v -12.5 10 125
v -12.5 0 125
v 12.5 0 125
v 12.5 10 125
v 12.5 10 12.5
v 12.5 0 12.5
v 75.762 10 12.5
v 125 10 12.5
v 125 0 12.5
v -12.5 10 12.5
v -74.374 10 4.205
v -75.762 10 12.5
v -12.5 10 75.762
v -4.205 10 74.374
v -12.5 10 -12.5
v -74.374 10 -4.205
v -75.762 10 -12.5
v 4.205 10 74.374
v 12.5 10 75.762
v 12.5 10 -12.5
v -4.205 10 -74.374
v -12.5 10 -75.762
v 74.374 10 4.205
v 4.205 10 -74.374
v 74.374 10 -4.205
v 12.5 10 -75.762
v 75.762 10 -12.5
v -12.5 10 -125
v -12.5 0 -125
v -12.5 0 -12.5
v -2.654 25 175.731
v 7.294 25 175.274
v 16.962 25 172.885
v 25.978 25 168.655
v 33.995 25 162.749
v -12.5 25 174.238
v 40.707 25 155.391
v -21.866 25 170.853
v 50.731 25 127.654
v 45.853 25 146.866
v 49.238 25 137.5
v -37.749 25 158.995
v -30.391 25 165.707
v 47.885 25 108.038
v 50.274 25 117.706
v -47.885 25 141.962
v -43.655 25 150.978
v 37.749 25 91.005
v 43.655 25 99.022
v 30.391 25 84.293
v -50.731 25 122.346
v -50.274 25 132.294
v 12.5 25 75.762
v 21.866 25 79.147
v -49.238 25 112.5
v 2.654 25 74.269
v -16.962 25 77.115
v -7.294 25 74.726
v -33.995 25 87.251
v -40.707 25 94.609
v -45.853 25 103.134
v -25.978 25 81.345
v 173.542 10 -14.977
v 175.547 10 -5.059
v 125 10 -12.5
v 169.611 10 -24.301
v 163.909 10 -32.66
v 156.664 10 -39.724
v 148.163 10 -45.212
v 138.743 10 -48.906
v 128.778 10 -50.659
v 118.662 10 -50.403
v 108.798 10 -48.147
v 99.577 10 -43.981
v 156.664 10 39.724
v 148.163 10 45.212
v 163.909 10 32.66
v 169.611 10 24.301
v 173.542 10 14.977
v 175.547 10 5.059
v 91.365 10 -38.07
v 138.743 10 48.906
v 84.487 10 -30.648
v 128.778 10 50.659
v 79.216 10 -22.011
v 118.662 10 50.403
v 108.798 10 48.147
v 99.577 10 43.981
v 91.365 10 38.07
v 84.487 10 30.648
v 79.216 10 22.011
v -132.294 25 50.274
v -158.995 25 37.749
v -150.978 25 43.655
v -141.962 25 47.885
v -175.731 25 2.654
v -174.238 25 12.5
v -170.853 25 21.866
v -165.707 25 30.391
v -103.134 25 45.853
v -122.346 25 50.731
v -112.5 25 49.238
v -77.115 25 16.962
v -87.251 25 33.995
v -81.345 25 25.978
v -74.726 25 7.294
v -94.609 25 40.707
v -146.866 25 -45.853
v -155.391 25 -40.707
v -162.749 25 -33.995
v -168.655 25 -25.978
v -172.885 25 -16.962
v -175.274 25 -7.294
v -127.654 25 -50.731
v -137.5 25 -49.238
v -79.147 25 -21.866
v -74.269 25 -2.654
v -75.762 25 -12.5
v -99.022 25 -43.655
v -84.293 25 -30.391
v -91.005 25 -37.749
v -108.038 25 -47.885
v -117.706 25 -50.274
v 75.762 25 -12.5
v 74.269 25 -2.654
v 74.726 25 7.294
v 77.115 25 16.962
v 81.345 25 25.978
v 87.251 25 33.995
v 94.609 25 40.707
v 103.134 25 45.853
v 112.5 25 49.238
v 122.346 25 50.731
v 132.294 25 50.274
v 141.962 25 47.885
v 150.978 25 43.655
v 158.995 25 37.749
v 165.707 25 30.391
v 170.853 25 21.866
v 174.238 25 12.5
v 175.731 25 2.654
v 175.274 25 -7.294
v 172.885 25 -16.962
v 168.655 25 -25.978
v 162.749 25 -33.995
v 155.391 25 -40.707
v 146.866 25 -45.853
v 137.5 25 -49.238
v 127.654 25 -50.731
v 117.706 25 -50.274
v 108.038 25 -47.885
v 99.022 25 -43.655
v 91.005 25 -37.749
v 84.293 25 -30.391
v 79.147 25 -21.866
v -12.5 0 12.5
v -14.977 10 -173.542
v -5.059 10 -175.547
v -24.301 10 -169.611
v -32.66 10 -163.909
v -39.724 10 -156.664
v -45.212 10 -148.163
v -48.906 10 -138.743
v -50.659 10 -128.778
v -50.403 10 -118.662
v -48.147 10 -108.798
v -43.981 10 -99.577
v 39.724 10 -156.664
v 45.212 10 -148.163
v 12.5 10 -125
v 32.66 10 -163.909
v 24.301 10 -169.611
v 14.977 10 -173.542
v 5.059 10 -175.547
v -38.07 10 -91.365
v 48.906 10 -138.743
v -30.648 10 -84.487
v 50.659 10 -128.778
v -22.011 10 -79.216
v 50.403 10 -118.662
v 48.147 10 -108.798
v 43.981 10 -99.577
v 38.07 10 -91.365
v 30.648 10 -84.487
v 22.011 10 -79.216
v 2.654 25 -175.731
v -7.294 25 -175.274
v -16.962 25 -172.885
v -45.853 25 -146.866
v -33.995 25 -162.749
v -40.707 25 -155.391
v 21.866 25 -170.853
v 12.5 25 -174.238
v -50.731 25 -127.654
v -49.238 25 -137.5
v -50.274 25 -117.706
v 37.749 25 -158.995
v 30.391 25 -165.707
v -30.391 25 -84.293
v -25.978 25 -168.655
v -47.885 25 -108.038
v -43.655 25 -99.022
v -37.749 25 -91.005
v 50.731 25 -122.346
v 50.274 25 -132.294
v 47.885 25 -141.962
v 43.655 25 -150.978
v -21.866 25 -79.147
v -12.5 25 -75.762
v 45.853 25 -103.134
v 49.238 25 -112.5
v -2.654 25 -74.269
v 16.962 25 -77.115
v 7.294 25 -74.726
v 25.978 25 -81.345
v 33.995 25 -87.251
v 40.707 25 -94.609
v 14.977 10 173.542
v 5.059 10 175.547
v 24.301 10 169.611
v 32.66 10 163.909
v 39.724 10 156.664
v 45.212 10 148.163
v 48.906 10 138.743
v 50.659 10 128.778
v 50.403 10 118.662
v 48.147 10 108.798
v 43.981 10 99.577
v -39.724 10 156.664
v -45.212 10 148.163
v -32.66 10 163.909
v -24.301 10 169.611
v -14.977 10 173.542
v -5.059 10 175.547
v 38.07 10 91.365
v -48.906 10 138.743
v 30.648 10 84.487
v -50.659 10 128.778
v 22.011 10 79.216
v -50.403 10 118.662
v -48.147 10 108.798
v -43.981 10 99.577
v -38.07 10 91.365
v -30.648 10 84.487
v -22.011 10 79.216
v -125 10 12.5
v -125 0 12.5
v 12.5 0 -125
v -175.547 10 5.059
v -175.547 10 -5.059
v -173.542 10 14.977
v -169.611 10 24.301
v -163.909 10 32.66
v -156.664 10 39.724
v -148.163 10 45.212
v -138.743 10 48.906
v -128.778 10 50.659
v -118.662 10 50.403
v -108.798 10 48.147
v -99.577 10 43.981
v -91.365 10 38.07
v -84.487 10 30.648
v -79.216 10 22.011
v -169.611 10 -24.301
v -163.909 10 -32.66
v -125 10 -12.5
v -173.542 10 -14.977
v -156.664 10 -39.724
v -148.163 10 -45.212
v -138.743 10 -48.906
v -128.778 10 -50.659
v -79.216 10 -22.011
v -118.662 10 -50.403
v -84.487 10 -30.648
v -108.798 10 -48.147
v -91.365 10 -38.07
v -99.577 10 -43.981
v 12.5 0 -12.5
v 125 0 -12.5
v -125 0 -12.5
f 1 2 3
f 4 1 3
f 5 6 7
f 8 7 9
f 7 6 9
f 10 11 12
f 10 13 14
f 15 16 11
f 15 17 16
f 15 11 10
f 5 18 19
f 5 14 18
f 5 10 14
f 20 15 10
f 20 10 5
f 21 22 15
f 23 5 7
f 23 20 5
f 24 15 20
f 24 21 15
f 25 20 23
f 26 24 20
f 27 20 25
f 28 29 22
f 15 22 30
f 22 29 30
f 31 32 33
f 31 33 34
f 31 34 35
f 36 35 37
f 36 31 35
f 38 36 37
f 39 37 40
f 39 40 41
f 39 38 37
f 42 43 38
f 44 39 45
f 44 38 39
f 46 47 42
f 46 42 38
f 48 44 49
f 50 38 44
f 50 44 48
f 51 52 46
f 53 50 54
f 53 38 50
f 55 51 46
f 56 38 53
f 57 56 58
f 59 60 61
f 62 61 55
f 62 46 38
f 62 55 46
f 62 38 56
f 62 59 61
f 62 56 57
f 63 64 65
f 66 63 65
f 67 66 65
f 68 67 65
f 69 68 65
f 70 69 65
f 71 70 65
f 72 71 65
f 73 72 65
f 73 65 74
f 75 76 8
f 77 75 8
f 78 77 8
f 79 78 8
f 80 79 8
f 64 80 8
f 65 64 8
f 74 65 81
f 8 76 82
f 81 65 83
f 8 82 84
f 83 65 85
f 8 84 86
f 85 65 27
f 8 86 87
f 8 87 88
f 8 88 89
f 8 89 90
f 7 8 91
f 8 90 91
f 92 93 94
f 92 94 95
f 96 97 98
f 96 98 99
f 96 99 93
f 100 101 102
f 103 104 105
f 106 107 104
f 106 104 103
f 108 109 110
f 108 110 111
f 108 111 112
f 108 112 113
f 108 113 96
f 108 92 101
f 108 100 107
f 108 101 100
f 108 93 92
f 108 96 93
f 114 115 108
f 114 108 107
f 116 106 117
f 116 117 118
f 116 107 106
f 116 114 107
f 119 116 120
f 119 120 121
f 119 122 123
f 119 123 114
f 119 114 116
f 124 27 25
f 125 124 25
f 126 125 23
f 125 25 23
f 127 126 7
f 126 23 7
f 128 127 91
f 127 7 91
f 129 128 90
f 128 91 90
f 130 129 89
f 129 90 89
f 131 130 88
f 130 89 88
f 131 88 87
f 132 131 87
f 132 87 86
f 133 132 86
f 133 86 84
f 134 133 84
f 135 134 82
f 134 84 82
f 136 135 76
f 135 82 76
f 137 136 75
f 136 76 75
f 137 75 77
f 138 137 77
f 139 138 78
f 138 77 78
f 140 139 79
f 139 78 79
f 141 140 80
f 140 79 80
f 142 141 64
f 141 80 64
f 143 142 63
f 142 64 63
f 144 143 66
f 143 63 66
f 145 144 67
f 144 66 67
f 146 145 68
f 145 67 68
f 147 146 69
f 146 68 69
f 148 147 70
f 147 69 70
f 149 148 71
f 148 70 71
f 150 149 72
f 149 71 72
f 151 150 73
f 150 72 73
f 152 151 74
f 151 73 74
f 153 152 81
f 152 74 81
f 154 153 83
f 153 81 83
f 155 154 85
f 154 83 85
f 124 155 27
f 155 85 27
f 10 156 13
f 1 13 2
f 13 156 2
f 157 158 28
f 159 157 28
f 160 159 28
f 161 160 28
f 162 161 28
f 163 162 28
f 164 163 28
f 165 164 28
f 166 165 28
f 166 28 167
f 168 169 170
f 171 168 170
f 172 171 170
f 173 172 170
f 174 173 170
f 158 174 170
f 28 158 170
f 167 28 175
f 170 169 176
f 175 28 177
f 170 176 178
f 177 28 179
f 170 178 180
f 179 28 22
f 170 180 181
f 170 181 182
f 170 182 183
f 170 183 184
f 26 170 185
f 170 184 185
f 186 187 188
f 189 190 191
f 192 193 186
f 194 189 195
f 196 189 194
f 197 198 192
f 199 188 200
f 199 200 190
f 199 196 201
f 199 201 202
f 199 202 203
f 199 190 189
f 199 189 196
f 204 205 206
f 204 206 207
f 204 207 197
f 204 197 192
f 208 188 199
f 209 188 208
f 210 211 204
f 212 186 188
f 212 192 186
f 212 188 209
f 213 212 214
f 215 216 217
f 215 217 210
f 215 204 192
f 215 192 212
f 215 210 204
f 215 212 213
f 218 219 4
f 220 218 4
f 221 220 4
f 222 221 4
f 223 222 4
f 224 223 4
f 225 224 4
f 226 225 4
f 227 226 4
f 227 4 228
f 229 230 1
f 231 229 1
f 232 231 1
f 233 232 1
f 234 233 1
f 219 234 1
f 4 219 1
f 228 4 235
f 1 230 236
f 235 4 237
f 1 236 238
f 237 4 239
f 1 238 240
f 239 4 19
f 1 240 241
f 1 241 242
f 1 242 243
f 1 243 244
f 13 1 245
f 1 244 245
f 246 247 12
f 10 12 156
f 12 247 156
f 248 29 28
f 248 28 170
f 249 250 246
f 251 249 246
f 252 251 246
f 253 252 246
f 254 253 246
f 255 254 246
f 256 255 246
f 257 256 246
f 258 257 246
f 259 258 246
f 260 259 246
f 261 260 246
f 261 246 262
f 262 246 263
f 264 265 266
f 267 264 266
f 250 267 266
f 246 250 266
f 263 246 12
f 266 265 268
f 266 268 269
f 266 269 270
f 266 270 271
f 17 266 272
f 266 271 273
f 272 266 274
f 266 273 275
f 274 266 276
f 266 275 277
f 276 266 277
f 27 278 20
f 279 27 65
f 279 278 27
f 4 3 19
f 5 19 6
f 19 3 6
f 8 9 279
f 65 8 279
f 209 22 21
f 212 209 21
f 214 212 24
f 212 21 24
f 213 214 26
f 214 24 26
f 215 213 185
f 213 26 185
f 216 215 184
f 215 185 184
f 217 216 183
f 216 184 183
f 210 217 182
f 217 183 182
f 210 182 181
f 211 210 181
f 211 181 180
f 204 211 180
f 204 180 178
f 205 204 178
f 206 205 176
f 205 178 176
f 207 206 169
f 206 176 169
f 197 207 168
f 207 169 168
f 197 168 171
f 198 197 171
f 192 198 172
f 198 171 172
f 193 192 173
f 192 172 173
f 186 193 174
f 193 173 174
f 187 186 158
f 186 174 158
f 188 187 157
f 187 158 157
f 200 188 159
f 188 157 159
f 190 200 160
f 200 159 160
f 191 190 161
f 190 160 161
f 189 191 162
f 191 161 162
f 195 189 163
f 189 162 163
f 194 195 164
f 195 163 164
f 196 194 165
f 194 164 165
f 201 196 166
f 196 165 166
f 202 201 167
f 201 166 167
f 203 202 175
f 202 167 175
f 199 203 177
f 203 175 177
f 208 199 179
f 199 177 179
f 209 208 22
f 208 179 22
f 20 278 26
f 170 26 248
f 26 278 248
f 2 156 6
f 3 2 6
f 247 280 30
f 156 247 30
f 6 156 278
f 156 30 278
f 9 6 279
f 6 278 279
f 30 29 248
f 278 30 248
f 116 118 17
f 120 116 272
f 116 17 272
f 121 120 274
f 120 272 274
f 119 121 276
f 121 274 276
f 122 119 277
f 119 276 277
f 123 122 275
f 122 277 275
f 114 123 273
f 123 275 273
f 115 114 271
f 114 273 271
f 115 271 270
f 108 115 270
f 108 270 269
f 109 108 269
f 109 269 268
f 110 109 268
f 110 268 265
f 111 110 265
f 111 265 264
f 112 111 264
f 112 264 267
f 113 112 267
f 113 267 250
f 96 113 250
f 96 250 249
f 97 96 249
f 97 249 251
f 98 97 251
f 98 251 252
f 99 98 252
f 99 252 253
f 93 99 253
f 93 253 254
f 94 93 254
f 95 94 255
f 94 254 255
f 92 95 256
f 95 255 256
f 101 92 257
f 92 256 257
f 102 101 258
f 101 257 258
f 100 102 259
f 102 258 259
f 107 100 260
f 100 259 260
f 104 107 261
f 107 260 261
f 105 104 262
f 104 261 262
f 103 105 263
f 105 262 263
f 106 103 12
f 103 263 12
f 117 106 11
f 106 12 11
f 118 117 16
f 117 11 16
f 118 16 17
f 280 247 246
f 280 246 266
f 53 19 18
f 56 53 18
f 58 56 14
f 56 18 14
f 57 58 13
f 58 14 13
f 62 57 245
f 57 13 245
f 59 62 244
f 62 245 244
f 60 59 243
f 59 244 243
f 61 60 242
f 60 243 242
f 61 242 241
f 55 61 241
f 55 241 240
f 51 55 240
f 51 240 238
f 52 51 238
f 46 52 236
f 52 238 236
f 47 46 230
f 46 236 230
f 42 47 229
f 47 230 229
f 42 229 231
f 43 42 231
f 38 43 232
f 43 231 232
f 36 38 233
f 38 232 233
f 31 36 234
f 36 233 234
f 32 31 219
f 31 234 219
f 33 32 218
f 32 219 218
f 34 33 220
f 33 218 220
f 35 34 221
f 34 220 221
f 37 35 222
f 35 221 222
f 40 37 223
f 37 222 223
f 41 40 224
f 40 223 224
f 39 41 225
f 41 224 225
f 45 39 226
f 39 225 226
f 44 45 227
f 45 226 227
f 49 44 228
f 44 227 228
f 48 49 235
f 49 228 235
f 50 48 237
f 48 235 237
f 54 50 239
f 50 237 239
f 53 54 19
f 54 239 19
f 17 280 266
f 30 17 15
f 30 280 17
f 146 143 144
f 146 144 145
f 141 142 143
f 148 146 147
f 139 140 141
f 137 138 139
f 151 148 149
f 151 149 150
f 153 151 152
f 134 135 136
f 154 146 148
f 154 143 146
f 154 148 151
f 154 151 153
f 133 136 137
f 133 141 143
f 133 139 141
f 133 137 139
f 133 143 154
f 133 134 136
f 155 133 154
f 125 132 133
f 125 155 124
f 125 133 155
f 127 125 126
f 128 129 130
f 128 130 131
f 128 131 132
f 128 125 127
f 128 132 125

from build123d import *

# Parameters (mm, degrees)
SKETCH1_W           = 25
SKETCH1_H           = 112.5
SKETCH1_H_2         = 25
SKETCH1_W_2         = 112.5
BOSS_EXTRUDE1_DEPTH = 10
SKETCH2_R           = 50.8
BOSS_EXTRUDE2_DEPTH = 15


with BuildPart() as part:
    # Sketch1 → Boss-Extrude1 (new body)
    with BuildSketch(Plane(origin=(0, 0, 0), x_dir=(1, 0, 0), z_dir=(0, 1, 0))):
        with Locations((0, 68.75)):
            Rectangle(SKETCH1_W, SKETCH1_H)
        Rectangle(SKETCH1_W, SKETCH1_H_2)
        with Locations((0, -68.75)):
            Rectangle(SKETCH1_W, SKETCH1_H)
        with Locations((68.75, 0)):
            Rectangle(SKETCH1_W_2, SKETCH1_H_2)
        with Locations((-68.75, 0)):
            Rectangle(SKETCH1_W_2, SKETCH1_H_2)
    extrude(amount=BOSS_EXTRUDE1_DEPTH)

    # Sketch2 → Boss-Extrude2 (add)
    with BuildSketch(Plane(origin=(0, 10, 0), x_dir=(1, 0, 0), z_dir=(0, 1, 0))):
        with Locations(Location((0, 125, 0), (0, 0, 255.755338046))):
            Circle(SKETCH2_R)
        with Locations(Location((125, 0, 0), (0, 0, 165.755338046))):
            Circle(SKETCH2_R)
        with Locations(Location((0, -125, 0), (0, 0, 75.755338046))):
            Circle(SKETCH2_R)
        with Locations(Location((-125, 0, 0), (0, 0, 14.244661954))):
            Circle(SKETCH2_R)
    extrude(amount=BOSS_EXTRUDE2_DEPTH)


solid = part.part
